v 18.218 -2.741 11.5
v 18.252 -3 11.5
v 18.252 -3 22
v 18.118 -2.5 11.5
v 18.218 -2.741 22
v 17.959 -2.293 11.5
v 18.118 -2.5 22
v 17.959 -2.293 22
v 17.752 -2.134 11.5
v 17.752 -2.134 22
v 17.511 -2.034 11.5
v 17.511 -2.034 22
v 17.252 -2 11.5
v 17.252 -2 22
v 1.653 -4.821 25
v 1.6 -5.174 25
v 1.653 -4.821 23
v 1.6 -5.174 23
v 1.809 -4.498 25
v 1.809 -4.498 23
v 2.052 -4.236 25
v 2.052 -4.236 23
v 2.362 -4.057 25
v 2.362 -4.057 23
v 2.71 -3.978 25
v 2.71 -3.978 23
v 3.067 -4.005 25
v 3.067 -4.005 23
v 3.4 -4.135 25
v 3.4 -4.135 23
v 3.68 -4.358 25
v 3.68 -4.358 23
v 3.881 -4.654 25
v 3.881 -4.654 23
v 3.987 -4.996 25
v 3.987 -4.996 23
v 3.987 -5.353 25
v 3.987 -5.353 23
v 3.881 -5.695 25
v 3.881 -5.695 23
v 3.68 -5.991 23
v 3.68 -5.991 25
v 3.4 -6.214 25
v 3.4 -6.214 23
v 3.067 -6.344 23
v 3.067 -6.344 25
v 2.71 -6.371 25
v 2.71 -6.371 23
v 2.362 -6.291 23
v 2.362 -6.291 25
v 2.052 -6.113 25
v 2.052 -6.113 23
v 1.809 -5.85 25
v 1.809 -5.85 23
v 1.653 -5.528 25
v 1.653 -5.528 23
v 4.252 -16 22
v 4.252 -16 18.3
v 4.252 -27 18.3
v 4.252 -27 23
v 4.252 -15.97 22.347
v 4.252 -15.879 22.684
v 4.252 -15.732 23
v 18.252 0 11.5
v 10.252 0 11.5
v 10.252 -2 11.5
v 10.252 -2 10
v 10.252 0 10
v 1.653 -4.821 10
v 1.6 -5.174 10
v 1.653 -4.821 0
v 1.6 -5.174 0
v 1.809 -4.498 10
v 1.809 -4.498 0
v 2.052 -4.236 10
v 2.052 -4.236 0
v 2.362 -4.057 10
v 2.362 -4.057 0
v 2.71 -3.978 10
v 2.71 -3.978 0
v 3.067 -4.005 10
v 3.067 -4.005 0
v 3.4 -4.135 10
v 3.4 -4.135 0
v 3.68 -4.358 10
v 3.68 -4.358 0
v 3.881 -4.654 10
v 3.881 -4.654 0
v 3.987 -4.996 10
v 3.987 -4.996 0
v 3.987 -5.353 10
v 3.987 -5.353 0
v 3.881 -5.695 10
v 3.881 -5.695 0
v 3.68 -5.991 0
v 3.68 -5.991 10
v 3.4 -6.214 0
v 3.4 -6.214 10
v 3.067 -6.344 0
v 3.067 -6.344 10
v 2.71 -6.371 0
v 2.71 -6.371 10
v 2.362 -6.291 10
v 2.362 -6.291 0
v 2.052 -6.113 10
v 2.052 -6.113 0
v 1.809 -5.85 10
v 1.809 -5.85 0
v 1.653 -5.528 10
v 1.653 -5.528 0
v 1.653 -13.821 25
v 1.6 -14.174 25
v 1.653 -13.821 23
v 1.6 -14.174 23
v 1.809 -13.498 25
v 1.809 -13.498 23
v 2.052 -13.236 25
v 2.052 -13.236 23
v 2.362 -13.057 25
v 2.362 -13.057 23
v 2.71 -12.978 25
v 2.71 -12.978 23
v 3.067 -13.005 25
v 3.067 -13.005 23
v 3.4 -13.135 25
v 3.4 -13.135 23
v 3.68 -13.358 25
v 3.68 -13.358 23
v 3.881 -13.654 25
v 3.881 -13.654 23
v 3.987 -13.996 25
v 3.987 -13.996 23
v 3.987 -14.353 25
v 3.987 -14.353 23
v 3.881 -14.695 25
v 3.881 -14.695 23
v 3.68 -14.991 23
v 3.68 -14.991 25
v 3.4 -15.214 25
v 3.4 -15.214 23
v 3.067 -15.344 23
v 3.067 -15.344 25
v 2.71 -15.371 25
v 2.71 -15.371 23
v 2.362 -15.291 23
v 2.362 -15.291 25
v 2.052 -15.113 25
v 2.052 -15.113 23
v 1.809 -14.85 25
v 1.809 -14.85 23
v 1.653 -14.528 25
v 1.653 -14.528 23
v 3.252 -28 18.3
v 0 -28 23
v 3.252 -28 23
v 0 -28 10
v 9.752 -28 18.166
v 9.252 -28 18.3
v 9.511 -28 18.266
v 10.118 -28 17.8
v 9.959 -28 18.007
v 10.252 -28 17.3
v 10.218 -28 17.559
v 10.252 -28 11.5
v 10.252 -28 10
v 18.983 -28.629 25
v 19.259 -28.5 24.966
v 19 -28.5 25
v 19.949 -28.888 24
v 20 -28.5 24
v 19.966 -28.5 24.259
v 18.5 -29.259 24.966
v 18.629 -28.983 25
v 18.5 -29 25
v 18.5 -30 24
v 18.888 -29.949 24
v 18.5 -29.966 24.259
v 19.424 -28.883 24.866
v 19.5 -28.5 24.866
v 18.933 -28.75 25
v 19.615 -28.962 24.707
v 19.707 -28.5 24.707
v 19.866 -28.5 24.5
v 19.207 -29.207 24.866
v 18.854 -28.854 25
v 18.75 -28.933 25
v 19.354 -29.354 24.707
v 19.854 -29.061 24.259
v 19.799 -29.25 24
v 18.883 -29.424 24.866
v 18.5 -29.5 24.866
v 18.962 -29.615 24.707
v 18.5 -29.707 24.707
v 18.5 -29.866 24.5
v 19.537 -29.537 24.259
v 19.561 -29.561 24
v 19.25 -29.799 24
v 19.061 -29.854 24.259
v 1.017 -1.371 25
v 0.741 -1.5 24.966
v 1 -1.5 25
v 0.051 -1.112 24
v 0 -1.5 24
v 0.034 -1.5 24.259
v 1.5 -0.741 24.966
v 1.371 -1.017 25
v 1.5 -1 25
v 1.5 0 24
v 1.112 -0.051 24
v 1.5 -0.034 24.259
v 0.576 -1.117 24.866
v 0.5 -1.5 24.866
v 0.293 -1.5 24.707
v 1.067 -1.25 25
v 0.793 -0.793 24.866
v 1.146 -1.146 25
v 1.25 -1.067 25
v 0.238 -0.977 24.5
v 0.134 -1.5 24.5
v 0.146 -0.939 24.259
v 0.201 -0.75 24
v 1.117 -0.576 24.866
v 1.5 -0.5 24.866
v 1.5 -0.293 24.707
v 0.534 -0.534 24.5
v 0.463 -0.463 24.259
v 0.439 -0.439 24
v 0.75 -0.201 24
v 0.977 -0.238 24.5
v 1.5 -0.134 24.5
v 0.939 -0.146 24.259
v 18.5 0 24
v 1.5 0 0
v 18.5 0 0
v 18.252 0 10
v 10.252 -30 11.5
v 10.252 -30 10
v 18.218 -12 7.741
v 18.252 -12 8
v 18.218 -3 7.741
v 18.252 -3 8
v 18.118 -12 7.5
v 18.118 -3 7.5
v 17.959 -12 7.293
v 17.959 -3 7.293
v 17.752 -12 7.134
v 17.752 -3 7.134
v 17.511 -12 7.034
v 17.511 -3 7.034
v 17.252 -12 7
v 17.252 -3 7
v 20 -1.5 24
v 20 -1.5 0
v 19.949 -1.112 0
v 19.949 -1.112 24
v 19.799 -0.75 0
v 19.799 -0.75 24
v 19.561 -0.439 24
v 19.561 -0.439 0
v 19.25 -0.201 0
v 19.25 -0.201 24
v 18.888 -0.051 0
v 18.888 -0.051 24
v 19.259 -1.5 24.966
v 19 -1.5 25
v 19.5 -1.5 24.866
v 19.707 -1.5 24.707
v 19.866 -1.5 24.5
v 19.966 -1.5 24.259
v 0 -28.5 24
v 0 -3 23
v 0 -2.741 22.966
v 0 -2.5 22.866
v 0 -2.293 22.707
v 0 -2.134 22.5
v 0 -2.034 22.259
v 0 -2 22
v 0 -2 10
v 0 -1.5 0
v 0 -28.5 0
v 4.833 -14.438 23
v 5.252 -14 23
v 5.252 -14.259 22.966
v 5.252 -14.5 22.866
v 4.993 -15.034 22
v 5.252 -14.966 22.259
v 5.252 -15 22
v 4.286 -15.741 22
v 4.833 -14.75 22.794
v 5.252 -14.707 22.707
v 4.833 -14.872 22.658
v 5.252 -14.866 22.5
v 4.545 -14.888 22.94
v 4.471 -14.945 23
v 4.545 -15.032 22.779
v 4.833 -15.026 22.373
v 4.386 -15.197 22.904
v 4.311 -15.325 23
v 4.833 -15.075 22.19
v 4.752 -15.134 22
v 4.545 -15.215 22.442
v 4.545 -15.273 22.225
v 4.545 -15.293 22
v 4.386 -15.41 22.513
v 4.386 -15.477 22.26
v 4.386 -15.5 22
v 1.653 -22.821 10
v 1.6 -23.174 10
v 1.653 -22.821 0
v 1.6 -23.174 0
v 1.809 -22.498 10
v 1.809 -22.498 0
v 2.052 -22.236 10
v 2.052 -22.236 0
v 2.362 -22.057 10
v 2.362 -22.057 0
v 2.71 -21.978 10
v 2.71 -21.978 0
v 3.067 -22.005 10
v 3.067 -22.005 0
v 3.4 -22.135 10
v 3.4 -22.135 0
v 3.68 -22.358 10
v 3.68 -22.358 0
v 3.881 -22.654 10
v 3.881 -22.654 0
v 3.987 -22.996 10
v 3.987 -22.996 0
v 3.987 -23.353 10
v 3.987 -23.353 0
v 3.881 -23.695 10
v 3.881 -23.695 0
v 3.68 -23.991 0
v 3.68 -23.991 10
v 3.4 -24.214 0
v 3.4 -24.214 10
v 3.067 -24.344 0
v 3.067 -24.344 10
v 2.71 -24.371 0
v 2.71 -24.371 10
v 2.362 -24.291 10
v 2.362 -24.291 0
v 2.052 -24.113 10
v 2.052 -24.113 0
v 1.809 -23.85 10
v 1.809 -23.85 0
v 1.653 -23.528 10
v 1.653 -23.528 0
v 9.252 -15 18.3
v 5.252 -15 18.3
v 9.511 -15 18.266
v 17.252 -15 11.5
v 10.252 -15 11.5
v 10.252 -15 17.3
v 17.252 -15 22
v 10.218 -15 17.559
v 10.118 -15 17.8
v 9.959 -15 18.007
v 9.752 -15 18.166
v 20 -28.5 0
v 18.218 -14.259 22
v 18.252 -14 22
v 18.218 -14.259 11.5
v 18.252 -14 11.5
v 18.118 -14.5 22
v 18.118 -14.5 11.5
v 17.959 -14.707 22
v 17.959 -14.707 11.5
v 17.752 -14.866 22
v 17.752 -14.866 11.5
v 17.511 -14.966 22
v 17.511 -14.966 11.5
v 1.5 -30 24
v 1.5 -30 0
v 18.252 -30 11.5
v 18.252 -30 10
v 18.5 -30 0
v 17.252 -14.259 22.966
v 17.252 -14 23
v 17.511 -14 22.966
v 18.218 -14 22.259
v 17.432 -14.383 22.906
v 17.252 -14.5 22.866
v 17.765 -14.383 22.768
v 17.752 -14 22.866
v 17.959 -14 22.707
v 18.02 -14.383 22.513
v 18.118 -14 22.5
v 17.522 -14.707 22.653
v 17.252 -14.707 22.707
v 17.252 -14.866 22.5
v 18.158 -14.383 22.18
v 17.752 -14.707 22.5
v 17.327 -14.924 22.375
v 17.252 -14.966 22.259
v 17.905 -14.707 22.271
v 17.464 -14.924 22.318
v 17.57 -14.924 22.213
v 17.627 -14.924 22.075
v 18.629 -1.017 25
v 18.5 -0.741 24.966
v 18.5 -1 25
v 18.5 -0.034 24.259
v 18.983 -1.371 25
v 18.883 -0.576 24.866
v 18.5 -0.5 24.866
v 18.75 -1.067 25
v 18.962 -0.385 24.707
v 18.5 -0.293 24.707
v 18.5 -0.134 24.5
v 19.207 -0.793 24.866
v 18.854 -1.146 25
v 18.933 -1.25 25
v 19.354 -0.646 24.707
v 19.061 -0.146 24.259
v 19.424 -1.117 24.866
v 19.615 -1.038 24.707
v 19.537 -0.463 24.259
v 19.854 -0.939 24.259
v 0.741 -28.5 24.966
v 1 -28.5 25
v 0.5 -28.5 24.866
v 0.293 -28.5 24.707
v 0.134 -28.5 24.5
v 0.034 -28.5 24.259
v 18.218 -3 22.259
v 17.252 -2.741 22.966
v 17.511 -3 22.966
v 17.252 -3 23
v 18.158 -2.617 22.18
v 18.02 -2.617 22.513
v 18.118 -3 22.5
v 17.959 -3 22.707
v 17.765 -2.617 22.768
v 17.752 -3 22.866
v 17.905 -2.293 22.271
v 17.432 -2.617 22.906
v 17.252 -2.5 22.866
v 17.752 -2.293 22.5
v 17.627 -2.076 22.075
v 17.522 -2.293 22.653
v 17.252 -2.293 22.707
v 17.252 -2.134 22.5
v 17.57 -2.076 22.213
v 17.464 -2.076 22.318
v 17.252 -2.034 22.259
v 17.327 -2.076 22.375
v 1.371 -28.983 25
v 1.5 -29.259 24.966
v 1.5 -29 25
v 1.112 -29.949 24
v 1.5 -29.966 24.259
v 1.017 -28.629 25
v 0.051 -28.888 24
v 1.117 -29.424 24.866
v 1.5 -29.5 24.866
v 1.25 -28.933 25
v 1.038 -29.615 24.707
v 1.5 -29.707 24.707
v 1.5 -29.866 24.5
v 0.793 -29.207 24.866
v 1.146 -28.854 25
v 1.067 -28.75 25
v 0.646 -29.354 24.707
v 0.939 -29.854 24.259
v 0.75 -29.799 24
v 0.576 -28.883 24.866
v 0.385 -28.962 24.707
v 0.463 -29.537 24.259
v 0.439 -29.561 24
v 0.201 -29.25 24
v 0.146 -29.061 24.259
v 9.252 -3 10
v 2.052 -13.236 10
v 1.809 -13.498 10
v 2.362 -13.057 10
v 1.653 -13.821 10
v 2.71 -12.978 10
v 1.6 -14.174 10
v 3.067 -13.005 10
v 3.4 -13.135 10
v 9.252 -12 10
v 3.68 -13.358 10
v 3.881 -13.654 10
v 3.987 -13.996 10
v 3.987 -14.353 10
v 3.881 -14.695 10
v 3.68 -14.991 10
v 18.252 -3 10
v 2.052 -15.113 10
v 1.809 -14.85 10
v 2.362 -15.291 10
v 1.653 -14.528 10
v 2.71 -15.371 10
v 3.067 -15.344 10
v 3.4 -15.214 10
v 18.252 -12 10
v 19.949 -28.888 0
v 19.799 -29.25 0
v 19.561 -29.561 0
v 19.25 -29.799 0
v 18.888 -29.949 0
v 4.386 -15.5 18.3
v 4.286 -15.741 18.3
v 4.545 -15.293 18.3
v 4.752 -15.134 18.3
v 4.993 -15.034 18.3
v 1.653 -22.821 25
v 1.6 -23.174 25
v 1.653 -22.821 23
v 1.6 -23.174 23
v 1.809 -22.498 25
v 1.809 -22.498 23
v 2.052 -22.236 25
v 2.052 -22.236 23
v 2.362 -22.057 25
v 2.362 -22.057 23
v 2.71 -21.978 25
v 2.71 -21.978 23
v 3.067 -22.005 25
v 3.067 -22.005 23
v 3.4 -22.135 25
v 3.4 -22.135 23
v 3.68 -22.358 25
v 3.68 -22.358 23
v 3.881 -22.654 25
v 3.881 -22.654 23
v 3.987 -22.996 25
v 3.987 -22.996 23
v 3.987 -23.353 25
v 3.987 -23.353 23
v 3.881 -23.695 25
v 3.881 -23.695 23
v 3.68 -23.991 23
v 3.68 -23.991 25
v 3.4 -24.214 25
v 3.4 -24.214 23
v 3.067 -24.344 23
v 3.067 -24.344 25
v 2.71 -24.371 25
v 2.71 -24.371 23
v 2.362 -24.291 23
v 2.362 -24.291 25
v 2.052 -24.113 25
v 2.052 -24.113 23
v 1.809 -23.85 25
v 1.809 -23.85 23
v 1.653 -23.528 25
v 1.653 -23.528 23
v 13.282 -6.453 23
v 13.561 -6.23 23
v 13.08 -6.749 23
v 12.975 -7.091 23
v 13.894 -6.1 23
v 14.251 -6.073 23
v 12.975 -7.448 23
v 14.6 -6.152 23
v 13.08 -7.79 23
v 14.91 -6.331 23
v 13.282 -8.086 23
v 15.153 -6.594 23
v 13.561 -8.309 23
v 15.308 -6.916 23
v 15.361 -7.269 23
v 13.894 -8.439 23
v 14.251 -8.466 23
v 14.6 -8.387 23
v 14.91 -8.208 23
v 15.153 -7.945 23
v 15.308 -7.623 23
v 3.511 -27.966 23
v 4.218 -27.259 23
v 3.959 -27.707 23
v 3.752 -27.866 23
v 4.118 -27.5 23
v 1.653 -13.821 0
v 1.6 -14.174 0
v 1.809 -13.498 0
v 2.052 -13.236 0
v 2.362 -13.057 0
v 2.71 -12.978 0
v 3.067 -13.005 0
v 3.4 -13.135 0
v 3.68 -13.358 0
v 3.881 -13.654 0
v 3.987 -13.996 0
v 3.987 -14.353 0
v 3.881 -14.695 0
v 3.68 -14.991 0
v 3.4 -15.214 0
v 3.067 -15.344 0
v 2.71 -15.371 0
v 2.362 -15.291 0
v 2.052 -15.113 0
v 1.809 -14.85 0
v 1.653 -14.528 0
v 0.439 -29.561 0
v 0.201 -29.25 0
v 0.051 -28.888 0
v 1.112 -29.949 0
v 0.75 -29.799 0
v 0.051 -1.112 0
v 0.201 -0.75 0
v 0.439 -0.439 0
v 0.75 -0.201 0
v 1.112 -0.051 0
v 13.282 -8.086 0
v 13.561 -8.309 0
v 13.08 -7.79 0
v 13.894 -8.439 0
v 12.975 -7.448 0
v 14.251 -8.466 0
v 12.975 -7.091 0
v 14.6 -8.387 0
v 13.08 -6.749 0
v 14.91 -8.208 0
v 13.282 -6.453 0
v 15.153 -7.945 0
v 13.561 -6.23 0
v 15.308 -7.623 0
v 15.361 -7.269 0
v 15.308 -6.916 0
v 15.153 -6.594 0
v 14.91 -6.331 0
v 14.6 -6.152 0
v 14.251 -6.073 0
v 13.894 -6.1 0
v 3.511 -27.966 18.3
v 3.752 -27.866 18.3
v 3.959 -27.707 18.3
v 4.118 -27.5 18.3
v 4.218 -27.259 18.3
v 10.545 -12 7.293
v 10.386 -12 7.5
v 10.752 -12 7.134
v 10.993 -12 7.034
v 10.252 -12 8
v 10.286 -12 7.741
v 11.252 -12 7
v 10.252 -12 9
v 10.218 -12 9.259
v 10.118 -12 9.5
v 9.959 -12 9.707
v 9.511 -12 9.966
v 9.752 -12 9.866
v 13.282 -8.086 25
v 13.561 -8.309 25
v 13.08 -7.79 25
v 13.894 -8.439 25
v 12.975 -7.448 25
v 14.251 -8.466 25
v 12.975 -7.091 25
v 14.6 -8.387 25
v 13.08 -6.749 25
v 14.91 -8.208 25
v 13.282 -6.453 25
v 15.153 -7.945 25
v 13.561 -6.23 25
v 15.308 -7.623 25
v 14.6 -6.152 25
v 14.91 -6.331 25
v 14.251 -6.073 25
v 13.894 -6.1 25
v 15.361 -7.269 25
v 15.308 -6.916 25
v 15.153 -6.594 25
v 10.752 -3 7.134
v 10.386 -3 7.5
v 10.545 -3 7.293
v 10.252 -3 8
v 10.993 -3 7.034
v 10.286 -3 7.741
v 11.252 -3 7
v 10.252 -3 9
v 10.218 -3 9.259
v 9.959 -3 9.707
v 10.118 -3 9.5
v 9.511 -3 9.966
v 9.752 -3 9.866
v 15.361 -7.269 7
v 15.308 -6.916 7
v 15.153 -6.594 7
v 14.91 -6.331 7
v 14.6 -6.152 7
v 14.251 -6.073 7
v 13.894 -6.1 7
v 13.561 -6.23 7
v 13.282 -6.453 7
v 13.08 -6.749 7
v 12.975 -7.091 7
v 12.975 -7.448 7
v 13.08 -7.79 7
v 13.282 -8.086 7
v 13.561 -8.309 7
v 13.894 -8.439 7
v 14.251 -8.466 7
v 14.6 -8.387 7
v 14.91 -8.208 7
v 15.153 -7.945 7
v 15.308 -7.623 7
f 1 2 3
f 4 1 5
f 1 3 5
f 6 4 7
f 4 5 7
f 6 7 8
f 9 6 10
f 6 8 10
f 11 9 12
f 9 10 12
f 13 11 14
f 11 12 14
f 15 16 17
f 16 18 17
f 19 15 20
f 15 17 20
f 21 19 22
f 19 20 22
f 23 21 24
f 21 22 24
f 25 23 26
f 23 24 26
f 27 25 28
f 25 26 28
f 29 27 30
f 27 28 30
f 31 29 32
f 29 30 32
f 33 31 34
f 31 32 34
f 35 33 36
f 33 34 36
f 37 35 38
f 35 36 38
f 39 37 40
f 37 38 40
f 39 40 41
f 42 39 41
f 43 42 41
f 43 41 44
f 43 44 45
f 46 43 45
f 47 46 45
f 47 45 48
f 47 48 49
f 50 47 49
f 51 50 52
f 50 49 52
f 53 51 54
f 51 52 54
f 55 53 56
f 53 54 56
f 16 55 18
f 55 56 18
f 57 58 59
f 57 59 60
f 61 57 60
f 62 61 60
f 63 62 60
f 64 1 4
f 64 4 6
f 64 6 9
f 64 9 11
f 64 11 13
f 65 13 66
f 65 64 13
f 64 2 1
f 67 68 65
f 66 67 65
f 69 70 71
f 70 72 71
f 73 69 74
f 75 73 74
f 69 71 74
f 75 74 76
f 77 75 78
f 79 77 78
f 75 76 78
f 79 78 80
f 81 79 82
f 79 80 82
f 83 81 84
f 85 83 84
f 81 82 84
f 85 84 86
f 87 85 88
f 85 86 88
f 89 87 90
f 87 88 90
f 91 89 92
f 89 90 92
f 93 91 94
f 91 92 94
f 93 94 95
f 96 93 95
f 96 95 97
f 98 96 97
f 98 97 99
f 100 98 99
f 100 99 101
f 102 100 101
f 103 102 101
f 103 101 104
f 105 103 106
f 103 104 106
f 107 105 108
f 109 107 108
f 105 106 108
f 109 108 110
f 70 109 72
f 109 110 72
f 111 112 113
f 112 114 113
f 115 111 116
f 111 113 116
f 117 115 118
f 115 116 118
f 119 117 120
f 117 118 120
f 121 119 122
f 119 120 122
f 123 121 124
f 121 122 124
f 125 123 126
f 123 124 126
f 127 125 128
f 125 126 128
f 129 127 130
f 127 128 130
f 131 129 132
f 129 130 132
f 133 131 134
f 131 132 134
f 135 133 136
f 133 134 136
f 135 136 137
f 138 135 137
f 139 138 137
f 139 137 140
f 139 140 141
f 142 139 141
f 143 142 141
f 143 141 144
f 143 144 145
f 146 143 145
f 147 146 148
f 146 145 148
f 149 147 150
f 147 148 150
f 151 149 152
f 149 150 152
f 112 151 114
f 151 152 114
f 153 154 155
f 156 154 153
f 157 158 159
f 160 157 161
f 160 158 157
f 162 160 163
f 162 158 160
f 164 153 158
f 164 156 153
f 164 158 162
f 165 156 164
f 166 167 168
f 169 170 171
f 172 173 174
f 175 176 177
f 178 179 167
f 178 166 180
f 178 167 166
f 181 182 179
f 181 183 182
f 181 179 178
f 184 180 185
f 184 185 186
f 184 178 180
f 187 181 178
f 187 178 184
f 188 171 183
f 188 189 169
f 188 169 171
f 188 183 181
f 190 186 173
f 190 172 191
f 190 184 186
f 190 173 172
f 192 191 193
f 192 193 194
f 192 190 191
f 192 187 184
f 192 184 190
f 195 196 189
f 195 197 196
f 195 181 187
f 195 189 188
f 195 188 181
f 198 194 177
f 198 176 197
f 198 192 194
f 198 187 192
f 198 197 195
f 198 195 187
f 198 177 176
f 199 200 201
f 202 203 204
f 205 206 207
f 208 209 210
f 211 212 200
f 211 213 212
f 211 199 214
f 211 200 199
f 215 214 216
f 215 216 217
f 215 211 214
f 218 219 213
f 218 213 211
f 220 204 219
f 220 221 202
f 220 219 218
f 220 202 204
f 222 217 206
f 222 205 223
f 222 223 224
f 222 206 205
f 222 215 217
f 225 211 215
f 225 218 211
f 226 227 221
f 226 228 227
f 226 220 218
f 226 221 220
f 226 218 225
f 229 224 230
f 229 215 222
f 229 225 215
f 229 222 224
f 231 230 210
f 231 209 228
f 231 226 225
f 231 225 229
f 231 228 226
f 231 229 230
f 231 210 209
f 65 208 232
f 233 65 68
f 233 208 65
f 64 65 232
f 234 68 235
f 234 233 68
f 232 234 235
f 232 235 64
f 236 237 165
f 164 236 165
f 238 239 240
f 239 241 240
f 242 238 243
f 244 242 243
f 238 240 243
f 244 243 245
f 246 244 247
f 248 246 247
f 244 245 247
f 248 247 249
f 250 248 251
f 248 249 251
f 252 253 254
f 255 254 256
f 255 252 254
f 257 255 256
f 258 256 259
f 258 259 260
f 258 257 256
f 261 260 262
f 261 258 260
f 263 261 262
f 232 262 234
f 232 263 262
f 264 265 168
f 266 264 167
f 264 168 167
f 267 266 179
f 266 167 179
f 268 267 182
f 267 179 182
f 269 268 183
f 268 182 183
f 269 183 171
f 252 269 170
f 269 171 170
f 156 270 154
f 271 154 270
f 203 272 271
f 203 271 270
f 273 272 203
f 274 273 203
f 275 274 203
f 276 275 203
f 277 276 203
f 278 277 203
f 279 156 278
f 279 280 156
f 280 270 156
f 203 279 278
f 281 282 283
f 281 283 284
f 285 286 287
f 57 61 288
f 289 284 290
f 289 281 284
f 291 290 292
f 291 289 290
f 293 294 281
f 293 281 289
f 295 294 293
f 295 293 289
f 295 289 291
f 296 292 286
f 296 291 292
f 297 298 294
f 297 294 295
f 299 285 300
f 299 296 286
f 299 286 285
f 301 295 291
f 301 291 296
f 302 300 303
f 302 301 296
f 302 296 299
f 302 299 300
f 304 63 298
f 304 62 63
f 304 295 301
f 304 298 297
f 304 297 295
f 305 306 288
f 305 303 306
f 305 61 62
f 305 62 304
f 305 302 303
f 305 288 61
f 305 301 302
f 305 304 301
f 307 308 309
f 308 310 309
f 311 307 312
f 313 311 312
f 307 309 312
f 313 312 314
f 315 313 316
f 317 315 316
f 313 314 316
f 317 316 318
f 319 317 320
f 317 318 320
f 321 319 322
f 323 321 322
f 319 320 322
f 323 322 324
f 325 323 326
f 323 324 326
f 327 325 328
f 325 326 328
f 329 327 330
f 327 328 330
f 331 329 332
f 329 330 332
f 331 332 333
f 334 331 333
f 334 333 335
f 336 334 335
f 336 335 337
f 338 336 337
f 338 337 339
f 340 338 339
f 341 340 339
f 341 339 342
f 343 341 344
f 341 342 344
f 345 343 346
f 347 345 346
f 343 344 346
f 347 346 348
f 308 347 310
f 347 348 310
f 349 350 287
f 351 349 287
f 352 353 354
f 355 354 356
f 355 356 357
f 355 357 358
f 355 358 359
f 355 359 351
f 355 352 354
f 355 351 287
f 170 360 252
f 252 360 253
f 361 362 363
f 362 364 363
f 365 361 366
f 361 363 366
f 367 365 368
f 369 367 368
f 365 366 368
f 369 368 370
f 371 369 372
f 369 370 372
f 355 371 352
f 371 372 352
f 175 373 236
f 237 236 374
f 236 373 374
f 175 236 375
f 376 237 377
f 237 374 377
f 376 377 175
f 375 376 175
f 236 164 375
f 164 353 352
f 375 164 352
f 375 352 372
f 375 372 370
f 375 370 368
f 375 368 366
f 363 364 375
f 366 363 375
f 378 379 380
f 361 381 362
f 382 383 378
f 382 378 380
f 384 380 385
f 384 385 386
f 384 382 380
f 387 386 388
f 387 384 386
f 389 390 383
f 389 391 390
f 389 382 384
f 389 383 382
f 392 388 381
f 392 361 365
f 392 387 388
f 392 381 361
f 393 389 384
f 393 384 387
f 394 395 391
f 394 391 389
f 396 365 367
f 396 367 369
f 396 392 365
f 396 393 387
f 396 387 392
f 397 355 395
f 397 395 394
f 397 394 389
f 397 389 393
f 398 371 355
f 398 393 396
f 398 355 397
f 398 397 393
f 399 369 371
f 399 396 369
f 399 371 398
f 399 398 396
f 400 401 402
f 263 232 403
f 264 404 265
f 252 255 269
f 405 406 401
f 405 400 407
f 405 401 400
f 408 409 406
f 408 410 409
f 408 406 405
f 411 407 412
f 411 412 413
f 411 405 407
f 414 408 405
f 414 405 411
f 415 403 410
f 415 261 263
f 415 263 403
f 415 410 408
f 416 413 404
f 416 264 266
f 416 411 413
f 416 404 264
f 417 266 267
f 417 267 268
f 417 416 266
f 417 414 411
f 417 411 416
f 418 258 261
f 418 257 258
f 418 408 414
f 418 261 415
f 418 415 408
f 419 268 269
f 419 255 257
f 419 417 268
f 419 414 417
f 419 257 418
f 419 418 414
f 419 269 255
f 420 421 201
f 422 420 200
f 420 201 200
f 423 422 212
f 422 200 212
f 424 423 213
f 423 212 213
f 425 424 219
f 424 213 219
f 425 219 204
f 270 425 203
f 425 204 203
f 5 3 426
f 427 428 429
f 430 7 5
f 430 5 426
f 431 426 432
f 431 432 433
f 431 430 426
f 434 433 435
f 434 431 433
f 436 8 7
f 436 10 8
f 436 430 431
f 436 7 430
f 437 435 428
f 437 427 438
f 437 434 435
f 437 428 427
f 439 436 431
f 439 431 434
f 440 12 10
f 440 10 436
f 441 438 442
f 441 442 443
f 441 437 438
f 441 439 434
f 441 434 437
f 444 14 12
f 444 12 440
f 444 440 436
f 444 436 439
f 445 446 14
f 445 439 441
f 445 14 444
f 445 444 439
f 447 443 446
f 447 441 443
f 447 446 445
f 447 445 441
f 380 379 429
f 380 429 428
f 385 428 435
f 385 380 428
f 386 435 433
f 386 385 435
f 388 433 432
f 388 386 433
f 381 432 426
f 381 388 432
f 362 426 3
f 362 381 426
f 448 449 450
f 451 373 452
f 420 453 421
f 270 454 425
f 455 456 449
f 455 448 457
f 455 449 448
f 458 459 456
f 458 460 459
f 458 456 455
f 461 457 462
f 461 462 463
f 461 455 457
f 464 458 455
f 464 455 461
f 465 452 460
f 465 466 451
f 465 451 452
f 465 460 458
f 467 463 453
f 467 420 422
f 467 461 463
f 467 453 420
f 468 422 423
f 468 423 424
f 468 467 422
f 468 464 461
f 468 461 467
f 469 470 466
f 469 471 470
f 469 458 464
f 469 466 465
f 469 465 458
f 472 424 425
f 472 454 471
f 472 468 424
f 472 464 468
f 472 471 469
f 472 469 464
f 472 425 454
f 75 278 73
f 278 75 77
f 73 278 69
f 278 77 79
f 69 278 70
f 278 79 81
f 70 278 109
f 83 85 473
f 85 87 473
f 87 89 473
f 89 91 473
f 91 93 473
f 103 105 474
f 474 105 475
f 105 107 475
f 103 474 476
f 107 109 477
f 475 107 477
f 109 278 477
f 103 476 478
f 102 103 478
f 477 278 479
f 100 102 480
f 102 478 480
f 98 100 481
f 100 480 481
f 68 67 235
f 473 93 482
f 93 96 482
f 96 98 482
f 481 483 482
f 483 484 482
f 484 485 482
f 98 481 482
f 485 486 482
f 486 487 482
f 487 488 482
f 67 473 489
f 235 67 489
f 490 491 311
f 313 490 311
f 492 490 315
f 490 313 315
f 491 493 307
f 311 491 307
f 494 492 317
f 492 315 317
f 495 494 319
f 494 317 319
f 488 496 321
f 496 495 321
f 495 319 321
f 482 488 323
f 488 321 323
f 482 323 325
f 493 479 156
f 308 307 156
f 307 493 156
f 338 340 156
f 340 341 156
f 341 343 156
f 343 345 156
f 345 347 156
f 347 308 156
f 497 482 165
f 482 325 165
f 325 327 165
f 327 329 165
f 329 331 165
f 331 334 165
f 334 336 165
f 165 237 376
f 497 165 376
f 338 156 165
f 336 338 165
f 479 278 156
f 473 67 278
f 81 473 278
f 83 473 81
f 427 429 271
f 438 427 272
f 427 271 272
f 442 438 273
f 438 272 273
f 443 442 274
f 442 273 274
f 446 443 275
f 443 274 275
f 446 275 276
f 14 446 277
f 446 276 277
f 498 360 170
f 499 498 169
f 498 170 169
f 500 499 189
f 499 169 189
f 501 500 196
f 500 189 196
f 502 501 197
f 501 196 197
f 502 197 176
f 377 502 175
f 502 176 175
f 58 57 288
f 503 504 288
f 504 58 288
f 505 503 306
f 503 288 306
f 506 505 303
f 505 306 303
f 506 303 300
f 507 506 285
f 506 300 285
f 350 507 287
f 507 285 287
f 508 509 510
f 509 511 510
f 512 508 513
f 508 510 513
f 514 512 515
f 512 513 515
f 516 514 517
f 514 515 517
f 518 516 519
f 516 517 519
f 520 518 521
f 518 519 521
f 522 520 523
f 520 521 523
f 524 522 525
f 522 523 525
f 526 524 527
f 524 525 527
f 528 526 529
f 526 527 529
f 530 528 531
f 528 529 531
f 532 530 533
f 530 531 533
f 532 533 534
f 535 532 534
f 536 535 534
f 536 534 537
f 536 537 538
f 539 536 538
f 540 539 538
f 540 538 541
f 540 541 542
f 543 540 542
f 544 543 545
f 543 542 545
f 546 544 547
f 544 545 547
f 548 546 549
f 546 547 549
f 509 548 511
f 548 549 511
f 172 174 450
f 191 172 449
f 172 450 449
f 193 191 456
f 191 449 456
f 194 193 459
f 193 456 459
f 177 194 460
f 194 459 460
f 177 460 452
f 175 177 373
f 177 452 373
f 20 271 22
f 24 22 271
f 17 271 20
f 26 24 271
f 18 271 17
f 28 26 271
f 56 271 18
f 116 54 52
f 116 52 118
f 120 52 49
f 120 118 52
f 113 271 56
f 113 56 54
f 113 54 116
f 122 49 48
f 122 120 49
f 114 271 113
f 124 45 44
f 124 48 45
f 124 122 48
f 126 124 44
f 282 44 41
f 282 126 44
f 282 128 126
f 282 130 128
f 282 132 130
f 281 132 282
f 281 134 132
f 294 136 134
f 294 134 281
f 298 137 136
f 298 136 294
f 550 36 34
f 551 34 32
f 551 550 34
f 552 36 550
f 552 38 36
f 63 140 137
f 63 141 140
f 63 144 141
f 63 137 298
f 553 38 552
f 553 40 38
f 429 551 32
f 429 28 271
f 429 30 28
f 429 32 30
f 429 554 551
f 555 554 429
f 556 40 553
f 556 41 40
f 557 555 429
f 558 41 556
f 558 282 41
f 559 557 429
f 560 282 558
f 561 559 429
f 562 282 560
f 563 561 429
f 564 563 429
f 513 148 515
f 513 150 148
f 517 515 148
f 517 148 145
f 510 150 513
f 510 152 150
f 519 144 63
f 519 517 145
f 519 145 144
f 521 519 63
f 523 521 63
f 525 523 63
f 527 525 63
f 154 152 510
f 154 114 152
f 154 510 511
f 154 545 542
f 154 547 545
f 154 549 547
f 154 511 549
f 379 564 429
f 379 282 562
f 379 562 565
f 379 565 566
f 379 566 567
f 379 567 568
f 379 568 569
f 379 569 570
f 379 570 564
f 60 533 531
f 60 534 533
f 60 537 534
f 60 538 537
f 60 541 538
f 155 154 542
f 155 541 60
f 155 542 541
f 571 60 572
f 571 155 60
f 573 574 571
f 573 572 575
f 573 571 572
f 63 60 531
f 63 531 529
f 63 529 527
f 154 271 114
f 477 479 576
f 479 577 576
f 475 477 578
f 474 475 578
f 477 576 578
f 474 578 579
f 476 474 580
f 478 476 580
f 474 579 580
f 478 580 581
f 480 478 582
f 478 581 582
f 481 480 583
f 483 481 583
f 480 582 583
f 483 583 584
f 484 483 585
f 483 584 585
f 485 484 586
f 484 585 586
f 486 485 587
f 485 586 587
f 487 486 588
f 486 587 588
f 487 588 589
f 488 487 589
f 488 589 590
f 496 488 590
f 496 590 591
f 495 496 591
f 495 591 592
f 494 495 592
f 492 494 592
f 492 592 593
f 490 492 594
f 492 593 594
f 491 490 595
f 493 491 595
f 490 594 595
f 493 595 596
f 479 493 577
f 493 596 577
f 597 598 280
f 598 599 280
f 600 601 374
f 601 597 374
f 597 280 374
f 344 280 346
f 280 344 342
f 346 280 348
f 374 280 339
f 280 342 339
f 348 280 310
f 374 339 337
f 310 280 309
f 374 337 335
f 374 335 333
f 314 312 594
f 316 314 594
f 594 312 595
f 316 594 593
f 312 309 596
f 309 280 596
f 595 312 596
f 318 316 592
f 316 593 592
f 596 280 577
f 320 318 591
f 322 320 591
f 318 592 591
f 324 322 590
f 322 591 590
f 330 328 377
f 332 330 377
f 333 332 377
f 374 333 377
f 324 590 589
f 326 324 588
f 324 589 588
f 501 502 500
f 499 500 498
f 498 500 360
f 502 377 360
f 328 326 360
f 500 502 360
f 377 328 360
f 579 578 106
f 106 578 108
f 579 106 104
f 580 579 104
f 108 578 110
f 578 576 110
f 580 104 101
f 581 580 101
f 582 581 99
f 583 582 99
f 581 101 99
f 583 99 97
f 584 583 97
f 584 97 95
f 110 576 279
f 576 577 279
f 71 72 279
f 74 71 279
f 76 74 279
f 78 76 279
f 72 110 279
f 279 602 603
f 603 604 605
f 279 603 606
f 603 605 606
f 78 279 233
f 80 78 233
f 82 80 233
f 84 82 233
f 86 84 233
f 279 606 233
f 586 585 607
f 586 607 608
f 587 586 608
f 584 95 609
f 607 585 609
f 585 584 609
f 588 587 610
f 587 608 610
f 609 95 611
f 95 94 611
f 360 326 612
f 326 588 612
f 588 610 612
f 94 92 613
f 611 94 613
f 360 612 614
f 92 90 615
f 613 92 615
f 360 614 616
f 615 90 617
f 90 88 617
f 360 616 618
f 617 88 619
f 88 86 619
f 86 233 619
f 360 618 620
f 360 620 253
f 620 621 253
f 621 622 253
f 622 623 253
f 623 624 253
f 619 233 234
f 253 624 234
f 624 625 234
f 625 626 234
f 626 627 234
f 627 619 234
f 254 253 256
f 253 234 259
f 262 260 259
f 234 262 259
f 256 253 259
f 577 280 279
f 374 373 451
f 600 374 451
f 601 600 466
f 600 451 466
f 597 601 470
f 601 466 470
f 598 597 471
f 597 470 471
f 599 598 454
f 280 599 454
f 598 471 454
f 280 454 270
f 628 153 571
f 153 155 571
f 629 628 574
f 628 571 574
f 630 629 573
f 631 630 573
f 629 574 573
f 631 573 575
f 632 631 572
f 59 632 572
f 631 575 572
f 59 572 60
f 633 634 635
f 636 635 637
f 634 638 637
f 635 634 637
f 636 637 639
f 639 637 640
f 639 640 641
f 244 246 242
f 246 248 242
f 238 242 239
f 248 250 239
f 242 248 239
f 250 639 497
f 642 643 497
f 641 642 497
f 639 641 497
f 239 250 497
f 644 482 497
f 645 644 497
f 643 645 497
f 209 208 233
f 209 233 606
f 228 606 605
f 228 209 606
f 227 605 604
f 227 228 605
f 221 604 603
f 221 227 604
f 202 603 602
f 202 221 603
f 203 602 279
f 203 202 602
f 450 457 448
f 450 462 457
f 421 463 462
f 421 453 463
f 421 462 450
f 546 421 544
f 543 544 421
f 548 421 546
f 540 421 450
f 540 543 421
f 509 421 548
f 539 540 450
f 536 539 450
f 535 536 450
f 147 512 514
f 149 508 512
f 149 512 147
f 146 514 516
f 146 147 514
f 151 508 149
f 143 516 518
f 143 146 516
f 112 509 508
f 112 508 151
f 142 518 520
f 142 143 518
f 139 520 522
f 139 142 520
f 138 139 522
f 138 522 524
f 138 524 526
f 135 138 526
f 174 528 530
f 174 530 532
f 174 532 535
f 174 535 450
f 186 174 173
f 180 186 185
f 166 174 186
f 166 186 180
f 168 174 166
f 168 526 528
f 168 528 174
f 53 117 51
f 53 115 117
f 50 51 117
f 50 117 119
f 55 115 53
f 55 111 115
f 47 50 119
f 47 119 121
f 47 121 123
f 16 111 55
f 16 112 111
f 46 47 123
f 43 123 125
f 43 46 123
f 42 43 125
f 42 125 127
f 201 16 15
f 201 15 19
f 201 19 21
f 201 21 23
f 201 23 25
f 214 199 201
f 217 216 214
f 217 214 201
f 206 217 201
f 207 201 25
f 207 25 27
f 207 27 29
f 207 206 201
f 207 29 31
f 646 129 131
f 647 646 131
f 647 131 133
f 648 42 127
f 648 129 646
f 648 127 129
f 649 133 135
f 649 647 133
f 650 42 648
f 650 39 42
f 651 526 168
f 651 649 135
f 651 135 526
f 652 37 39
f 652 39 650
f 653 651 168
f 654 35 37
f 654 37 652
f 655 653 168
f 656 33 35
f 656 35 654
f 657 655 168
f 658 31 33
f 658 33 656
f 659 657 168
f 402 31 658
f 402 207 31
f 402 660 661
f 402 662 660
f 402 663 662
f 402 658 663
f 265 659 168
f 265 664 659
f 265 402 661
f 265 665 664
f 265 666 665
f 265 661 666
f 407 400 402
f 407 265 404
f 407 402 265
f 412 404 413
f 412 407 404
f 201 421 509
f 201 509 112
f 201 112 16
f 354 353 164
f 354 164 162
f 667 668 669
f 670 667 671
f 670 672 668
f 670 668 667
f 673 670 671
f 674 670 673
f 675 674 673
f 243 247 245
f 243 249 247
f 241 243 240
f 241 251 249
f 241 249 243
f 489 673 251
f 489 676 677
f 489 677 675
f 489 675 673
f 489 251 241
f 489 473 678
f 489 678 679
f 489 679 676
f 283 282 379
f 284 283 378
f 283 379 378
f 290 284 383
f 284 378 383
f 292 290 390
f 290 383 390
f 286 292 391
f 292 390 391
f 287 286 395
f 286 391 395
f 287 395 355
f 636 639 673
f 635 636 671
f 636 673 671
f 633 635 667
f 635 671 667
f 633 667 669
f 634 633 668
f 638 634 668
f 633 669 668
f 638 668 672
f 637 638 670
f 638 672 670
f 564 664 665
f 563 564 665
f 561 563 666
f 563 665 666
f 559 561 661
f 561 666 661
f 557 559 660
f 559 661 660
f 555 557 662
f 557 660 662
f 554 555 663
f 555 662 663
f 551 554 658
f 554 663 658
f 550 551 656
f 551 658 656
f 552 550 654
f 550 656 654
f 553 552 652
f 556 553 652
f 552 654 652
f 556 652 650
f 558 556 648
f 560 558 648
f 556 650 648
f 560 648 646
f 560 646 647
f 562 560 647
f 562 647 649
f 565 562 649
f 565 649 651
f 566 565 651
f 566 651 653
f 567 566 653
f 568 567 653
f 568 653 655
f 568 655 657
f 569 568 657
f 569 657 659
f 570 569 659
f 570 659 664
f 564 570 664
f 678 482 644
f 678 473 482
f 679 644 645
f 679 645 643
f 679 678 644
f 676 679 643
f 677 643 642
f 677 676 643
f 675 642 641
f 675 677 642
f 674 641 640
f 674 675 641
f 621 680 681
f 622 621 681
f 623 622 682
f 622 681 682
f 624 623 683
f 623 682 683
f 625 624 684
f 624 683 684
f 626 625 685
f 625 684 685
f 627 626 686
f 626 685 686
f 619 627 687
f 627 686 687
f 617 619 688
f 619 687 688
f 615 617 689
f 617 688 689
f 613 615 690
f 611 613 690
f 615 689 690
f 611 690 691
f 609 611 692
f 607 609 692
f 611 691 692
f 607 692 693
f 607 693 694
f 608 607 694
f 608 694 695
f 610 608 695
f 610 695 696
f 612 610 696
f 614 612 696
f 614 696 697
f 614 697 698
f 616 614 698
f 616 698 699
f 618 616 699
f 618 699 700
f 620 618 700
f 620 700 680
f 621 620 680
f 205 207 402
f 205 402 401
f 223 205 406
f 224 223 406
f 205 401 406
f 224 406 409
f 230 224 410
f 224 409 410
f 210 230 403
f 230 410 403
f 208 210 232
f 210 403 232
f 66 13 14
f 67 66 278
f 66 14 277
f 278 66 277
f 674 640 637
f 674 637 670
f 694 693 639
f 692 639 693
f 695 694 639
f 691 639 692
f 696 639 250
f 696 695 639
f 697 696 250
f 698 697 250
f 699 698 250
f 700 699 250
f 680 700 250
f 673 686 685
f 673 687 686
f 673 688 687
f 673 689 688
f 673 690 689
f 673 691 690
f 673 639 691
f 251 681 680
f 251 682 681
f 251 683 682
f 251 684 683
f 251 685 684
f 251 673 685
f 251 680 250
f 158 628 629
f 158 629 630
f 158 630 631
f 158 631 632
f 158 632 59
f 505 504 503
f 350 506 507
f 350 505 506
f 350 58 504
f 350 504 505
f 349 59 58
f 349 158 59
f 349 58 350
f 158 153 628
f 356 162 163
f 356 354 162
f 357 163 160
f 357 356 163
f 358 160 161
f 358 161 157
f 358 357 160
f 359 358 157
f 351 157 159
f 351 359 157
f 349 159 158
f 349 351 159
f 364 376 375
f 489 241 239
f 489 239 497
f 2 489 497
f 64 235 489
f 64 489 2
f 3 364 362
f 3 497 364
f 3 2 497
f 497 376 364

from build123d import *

# Parameters (mm, degrees)
SKETCH1_W               = 20
SKETCH1_H               = 30
BOSS_EXTRUDE1_DEPTH     = 25
CUT_EXTRUDE2_DEPTH      = 44.874821937
CUT_EXTRUDE2_DEPTH_BACK = 44.874821937
SKETCH4_W               = 8
SKETCH4_H               = 1.5
SKETCH5_W               = 8
SKETCH5_H               = 11.5
CUT_EXTRUDE3_DEPTH      = 15
SKETCH6_W               = 6.664038992
SKETCH6_H               = 13
CUT_EXTRUDE4_DEPTH      = 28
SKETCH7_W               = 8
SKETCH7_H               = 9
CUT_EXTRUDE5_DEPTH      = 3
SKETCH11_W              = 6.664038992
SKETCH11_H              = 2
BOSS_EXTRUDE2_DEPTH     = 13
SKETCH12_W              = 8
SKETCH12_H              = 2
BOSS_EXTRUDE3_DEPTH     = 11.5
SKETCH13_W              = 13
SKETCH13_H              = 26
CUT_EXTRUDE7_DEPTH      = 4
SKETCH18_R              = 1.2
CUT_EXTRUDE8_DEPTH      = 44.874821937
LPATTERN1_COUNT         = 3
LPATTERN1_PITCH         = 9
SKETCH19_W              = 4.7
SKETCH19_H              = 13
BOSS_EXTRUDE5_DEPTH     = 6
FILLET1_R               = 1.5
FILLET2_R               = 1
FILLET3_R               = 1
FILLET4_R               = 1
FILLET5_R               = 1
FILLET6_R               = 1
FILLET7_R               = 1
FILLET8_R               = 1
FILLET9_R               = 1
FILLET11_R              = 1
SKETCH20_R              = 1.2
CUT_EXTRUDE9_DEPTH      = 44.874821937


with BuildPart() as part:
    # Sketch1 → Boss-Extrude1 (new body)
    with BuildSketch(Plane.XY):
        with Locations((10, -15)):
            Rectangle(SKETCH1_W, SKETCH1_H)
    extrude(amount=BOSS_EXTRUDE1_DEPTH)

    # Sketch4 → Cut-Extrude2 (cut, two sides: drawn at the far end of the back side and taken through both)
    with BuildSketch(Plane.XZ.offset(30).offset(-CUT_EXTRUDE2_DEPTH_BACK)):
        with Locations((14.251880329, 10.75)):
            Rectangle(SKETCH4_W, SKETCH4_H)
    extrude(amount=CUT_EXTRUDE2_DEPTH + CUT_EXTRUDE2_DEPTH_BACK, mode=Mode.SUBTRACT)

    # Sketch5 → Cut-Extrude3 (cut)
    with BuildSketch(Plane(origin=(0, 0, 0), x_dir=(1, 0, 0), z_dir=(0, 1, 0))):
        with Locations((14.251880329, -17.25)):
            Rectangle(SKETCH5_W, SKETCH5_H)
    extrude(amount=-CUT_EXTRUDE3_DEPTH, mode=Mode.SUBTRACT)

    # Sketch6 → Cut-Extrude4 (cut)
    with BuildSketch(Plane.XZ.offset(30)):
        with Locations((6.919860833, 16.5)):
            Rectangle(SKETCH6_W, SKETCH6_H)
    extrude(amount=-CUT_EXTRUDE4_DEPTH, mode=Mode.SUBTRACT)

    # Sketch7 → Cut-Extrude5 (cut)
    with BuildSketch(Plane.XY.offset(10)):
        with Locations((14.251880329, -7.5)):
            Rectangle(SKETCH7_W, SKETCH7_H)
    extrude(amount=-CUT_EXTRUDE5_DEPTH, mode=Mode.SUBTRACT)

    # Sketch11 → Boss-Extrude2 (add)
    with BuildSketch(Plane.XY.offset(10)):
        with Locations((6.919860833, -29)):
            Rectangle(SKETCH11_W, SKETCH11_H)
    extrude(amount=BOSS_EXTRUDE2_DEPTH)

    # Sketch12 → Boss-Extrude3 (add)
    with BuildSketch(Plane(origin=(0, 0, 23), x_dir=(-1, 0, 0), z_dir=(0, 0, -1))):
        with Locations((-14.251880329, -1)):
            Rectangle(SKETCH12_W, SKETCH12_H)
    extrude(amount=BOSS_EXTRUDE3_DEPTH)

    # Sketch13 → Cut-Extrude7 (cut)
    with BuildSketch(Plane.ZY):
        with Locations((16.5, -15)):
            Rectangle(SKETCH13_W, SKETCH13_H)
    extrude(amount=-CUT_EXTRUDE7_DEPTH, mode=Mode.SUBTRACT)

    # Sketch18 → Cut-Extrude8 (cut, symmetric)
    with BuildSketch(Plane(origin=(0, 0, 0), x_dir=(-1, 0, 0), z_dir=(0, 0, -1))):
        with Locations((-2.8, -23.174436274)):
            Circle(SKETCH18_R)
    cut_extrude8 = extrude(amount=CUT_EXTRUDE8_DEPTH, both=True, mode=Mode.SUBTRACT)

    # LPattern1: Cut-Extrude8 ×3
    with Locations(*[(0, i * LPATTERN1_PITCH, 0) for i in range(1, LPATTERN1_COUNT)]):
        add(cut_extrude8, mode=Mode.SUBTRACT)

    # Sketch19 → Boss-Extrude5 (add)
    with BuildSketch(Plane.ZY.offset(-10.251880329)):
        with Locations((20.65, -21.5)):
            Rectangle(SKETCH19_W, SKETCH19_H)
    extrude(amount=BOSS_EXTRUDE5_DEPTH)

    # Fillet1
    fillet1_edges = [part.edges().sort_by_distance(p)[0] for p in [
        (20, 0, 12.5),
        (20, -30, 12.5),
        (0, -30, 12.5),
        (0, 0, 12.5),
    ]]
    fillet(fillet1_edges, radius=FILLET1_R)

    # Fillet2
    fillet2_edges = [part.edges().sort_by_distance(p)[0] for p in [
        (10.251880329, -21.5, 18.3),
    ]]
    fillet(fillet2_edges, radius=FILLET2_R)

    # Fillet3
    fillet3_edges = [part.edges().sort_by_distance(p)[0] for p in [
        (10.251880329, -7.5, 10),
    ]]
    fillet(fillet3_edges, radius=FILLET3_R)

    # Fillet4
    fillet4_edges = [part.edges().sort_by_distance(p)[0] for p in [
        (18.251880329, -8.5, 23),
    ]]
    fillet(fillet4_edges, radius=FILLET4_R)

    # Fillet5
    fillet5_edges = [part.edges().sort_by_distance(p)[0] for p in [
        (10, 0, 25),
        (20, -15, 25),
        (0, -15, 25),
        (10, -30, 25),
        (0.439339828, -29.560660172, 25),
        (19.560660172, -29.560660172, 25),
        (0.439339828, -0.439339828, 25),
        (19.560660172, -0.439339828, 25),
    ]]
    fillet(fillet5_edges, radius=FILLET5_R)

    # Fillet6
    fillet6_edges = [part.edges().sort_by_distance(p)[0] for p in [
        (18.251880329, -7.5, 7),
        (10.251880329, -7.5, 7),
    ]]
    fillet(fillet6_edges, radius=FILLET6_R)

    # Fillet7
    fillet7_edges = [part.edges().sort_by_distance(p)[0] for p in [
        (18.251880329, -15, 16.75),
        (17.95898711, -15, 22.707106781),
        (10.751880329, -15, 23),
    ]]
    fillet(fillet7_edges, radius=FILLET7_R)

    # Fillet8
    fillet8_edges = [part.edges().sort_by_distance(p)[0] for p in [
        (8.625940164, -2, 23),
        (17.95898711, -2, 22.707106781),
        (18.251880329, -2, 16.75),
    ]]
    fillet(fillet8_edges, radius=FILLET8_R)

    # Fillet9
    # the kernel refuses this fillet: 1 mm, written as the material it takes off along each edge
    with BuildSketch(Plane(origin=(4.251880329, -15, 22), x_dir=(0, -1, 0), z_dir=(0, 0, -1))) as fillet9_piece_1:
        with BuildLine():
            CenterArc((FILLET9_R, -FILLET9_R), FILLET9_R, 90, 90)
            Line((0, -FILLET9_R), (0, 0))
            Line((0, 0), (FILLET9_R, 0))
        make_face()
    extrude(amount=6.2, mode=Mode.SUBTRACT)
    with BuildSketch(Plane(origin=(4.251880329, -14, 22), x_dir=(0, 0.5976672776328242, -0.8017442392976507), z_dir=(0, -0.8017442392976507, -0.5976672776328242))) as fillet9_piece_2_section:
        with BuildLine():
            CenterArc((1 + FILLET9_R, FILLET9_R), FILLET9_R, 180, 90)
            Line((1 + FILLET9_R, 0), (1, 0))
            Line((1, 0), (1, FILLET9_R))
        make_face()
    fillet9_piece_2 = revolve(axis=Axis((4.251880329, -14, 22), (1, 0, 0)), revolution_arc=233.296989237, mode=Mode.PRIVATE)
    fillet9_piece_2 = split(fillet9_piece_2, bisect_by=Plane(origin=(4.563508846, -14.749938848, 23), z_dir=(0, 0, -1)), keep=Keep.TOP, mode=Mode.PRIVATE)
    add(fillet9_piece_2, mode=Mode.SUBTRACT)

    # Fillet11
    fillet11_edges = [part.edges().sort_by_distance(p)[0] for p in [
        (4.251880329, -28, 20.65),
    ]]
    fillet(fillet11_edges, radius=FILLET11_R)

    # Sketch20 → Cut-Extrude9 (cut, through all)
    with BuildSketch(Plane.XY.offset(25)):
        with Locations((14.161317573, -7.269489093)):
            Circle(SKETCH20_R)
    extrude(amount=-CUT_EXTRUDE9_DEPTH, mode=Mode.SUBTRACT)


solid = part.part
